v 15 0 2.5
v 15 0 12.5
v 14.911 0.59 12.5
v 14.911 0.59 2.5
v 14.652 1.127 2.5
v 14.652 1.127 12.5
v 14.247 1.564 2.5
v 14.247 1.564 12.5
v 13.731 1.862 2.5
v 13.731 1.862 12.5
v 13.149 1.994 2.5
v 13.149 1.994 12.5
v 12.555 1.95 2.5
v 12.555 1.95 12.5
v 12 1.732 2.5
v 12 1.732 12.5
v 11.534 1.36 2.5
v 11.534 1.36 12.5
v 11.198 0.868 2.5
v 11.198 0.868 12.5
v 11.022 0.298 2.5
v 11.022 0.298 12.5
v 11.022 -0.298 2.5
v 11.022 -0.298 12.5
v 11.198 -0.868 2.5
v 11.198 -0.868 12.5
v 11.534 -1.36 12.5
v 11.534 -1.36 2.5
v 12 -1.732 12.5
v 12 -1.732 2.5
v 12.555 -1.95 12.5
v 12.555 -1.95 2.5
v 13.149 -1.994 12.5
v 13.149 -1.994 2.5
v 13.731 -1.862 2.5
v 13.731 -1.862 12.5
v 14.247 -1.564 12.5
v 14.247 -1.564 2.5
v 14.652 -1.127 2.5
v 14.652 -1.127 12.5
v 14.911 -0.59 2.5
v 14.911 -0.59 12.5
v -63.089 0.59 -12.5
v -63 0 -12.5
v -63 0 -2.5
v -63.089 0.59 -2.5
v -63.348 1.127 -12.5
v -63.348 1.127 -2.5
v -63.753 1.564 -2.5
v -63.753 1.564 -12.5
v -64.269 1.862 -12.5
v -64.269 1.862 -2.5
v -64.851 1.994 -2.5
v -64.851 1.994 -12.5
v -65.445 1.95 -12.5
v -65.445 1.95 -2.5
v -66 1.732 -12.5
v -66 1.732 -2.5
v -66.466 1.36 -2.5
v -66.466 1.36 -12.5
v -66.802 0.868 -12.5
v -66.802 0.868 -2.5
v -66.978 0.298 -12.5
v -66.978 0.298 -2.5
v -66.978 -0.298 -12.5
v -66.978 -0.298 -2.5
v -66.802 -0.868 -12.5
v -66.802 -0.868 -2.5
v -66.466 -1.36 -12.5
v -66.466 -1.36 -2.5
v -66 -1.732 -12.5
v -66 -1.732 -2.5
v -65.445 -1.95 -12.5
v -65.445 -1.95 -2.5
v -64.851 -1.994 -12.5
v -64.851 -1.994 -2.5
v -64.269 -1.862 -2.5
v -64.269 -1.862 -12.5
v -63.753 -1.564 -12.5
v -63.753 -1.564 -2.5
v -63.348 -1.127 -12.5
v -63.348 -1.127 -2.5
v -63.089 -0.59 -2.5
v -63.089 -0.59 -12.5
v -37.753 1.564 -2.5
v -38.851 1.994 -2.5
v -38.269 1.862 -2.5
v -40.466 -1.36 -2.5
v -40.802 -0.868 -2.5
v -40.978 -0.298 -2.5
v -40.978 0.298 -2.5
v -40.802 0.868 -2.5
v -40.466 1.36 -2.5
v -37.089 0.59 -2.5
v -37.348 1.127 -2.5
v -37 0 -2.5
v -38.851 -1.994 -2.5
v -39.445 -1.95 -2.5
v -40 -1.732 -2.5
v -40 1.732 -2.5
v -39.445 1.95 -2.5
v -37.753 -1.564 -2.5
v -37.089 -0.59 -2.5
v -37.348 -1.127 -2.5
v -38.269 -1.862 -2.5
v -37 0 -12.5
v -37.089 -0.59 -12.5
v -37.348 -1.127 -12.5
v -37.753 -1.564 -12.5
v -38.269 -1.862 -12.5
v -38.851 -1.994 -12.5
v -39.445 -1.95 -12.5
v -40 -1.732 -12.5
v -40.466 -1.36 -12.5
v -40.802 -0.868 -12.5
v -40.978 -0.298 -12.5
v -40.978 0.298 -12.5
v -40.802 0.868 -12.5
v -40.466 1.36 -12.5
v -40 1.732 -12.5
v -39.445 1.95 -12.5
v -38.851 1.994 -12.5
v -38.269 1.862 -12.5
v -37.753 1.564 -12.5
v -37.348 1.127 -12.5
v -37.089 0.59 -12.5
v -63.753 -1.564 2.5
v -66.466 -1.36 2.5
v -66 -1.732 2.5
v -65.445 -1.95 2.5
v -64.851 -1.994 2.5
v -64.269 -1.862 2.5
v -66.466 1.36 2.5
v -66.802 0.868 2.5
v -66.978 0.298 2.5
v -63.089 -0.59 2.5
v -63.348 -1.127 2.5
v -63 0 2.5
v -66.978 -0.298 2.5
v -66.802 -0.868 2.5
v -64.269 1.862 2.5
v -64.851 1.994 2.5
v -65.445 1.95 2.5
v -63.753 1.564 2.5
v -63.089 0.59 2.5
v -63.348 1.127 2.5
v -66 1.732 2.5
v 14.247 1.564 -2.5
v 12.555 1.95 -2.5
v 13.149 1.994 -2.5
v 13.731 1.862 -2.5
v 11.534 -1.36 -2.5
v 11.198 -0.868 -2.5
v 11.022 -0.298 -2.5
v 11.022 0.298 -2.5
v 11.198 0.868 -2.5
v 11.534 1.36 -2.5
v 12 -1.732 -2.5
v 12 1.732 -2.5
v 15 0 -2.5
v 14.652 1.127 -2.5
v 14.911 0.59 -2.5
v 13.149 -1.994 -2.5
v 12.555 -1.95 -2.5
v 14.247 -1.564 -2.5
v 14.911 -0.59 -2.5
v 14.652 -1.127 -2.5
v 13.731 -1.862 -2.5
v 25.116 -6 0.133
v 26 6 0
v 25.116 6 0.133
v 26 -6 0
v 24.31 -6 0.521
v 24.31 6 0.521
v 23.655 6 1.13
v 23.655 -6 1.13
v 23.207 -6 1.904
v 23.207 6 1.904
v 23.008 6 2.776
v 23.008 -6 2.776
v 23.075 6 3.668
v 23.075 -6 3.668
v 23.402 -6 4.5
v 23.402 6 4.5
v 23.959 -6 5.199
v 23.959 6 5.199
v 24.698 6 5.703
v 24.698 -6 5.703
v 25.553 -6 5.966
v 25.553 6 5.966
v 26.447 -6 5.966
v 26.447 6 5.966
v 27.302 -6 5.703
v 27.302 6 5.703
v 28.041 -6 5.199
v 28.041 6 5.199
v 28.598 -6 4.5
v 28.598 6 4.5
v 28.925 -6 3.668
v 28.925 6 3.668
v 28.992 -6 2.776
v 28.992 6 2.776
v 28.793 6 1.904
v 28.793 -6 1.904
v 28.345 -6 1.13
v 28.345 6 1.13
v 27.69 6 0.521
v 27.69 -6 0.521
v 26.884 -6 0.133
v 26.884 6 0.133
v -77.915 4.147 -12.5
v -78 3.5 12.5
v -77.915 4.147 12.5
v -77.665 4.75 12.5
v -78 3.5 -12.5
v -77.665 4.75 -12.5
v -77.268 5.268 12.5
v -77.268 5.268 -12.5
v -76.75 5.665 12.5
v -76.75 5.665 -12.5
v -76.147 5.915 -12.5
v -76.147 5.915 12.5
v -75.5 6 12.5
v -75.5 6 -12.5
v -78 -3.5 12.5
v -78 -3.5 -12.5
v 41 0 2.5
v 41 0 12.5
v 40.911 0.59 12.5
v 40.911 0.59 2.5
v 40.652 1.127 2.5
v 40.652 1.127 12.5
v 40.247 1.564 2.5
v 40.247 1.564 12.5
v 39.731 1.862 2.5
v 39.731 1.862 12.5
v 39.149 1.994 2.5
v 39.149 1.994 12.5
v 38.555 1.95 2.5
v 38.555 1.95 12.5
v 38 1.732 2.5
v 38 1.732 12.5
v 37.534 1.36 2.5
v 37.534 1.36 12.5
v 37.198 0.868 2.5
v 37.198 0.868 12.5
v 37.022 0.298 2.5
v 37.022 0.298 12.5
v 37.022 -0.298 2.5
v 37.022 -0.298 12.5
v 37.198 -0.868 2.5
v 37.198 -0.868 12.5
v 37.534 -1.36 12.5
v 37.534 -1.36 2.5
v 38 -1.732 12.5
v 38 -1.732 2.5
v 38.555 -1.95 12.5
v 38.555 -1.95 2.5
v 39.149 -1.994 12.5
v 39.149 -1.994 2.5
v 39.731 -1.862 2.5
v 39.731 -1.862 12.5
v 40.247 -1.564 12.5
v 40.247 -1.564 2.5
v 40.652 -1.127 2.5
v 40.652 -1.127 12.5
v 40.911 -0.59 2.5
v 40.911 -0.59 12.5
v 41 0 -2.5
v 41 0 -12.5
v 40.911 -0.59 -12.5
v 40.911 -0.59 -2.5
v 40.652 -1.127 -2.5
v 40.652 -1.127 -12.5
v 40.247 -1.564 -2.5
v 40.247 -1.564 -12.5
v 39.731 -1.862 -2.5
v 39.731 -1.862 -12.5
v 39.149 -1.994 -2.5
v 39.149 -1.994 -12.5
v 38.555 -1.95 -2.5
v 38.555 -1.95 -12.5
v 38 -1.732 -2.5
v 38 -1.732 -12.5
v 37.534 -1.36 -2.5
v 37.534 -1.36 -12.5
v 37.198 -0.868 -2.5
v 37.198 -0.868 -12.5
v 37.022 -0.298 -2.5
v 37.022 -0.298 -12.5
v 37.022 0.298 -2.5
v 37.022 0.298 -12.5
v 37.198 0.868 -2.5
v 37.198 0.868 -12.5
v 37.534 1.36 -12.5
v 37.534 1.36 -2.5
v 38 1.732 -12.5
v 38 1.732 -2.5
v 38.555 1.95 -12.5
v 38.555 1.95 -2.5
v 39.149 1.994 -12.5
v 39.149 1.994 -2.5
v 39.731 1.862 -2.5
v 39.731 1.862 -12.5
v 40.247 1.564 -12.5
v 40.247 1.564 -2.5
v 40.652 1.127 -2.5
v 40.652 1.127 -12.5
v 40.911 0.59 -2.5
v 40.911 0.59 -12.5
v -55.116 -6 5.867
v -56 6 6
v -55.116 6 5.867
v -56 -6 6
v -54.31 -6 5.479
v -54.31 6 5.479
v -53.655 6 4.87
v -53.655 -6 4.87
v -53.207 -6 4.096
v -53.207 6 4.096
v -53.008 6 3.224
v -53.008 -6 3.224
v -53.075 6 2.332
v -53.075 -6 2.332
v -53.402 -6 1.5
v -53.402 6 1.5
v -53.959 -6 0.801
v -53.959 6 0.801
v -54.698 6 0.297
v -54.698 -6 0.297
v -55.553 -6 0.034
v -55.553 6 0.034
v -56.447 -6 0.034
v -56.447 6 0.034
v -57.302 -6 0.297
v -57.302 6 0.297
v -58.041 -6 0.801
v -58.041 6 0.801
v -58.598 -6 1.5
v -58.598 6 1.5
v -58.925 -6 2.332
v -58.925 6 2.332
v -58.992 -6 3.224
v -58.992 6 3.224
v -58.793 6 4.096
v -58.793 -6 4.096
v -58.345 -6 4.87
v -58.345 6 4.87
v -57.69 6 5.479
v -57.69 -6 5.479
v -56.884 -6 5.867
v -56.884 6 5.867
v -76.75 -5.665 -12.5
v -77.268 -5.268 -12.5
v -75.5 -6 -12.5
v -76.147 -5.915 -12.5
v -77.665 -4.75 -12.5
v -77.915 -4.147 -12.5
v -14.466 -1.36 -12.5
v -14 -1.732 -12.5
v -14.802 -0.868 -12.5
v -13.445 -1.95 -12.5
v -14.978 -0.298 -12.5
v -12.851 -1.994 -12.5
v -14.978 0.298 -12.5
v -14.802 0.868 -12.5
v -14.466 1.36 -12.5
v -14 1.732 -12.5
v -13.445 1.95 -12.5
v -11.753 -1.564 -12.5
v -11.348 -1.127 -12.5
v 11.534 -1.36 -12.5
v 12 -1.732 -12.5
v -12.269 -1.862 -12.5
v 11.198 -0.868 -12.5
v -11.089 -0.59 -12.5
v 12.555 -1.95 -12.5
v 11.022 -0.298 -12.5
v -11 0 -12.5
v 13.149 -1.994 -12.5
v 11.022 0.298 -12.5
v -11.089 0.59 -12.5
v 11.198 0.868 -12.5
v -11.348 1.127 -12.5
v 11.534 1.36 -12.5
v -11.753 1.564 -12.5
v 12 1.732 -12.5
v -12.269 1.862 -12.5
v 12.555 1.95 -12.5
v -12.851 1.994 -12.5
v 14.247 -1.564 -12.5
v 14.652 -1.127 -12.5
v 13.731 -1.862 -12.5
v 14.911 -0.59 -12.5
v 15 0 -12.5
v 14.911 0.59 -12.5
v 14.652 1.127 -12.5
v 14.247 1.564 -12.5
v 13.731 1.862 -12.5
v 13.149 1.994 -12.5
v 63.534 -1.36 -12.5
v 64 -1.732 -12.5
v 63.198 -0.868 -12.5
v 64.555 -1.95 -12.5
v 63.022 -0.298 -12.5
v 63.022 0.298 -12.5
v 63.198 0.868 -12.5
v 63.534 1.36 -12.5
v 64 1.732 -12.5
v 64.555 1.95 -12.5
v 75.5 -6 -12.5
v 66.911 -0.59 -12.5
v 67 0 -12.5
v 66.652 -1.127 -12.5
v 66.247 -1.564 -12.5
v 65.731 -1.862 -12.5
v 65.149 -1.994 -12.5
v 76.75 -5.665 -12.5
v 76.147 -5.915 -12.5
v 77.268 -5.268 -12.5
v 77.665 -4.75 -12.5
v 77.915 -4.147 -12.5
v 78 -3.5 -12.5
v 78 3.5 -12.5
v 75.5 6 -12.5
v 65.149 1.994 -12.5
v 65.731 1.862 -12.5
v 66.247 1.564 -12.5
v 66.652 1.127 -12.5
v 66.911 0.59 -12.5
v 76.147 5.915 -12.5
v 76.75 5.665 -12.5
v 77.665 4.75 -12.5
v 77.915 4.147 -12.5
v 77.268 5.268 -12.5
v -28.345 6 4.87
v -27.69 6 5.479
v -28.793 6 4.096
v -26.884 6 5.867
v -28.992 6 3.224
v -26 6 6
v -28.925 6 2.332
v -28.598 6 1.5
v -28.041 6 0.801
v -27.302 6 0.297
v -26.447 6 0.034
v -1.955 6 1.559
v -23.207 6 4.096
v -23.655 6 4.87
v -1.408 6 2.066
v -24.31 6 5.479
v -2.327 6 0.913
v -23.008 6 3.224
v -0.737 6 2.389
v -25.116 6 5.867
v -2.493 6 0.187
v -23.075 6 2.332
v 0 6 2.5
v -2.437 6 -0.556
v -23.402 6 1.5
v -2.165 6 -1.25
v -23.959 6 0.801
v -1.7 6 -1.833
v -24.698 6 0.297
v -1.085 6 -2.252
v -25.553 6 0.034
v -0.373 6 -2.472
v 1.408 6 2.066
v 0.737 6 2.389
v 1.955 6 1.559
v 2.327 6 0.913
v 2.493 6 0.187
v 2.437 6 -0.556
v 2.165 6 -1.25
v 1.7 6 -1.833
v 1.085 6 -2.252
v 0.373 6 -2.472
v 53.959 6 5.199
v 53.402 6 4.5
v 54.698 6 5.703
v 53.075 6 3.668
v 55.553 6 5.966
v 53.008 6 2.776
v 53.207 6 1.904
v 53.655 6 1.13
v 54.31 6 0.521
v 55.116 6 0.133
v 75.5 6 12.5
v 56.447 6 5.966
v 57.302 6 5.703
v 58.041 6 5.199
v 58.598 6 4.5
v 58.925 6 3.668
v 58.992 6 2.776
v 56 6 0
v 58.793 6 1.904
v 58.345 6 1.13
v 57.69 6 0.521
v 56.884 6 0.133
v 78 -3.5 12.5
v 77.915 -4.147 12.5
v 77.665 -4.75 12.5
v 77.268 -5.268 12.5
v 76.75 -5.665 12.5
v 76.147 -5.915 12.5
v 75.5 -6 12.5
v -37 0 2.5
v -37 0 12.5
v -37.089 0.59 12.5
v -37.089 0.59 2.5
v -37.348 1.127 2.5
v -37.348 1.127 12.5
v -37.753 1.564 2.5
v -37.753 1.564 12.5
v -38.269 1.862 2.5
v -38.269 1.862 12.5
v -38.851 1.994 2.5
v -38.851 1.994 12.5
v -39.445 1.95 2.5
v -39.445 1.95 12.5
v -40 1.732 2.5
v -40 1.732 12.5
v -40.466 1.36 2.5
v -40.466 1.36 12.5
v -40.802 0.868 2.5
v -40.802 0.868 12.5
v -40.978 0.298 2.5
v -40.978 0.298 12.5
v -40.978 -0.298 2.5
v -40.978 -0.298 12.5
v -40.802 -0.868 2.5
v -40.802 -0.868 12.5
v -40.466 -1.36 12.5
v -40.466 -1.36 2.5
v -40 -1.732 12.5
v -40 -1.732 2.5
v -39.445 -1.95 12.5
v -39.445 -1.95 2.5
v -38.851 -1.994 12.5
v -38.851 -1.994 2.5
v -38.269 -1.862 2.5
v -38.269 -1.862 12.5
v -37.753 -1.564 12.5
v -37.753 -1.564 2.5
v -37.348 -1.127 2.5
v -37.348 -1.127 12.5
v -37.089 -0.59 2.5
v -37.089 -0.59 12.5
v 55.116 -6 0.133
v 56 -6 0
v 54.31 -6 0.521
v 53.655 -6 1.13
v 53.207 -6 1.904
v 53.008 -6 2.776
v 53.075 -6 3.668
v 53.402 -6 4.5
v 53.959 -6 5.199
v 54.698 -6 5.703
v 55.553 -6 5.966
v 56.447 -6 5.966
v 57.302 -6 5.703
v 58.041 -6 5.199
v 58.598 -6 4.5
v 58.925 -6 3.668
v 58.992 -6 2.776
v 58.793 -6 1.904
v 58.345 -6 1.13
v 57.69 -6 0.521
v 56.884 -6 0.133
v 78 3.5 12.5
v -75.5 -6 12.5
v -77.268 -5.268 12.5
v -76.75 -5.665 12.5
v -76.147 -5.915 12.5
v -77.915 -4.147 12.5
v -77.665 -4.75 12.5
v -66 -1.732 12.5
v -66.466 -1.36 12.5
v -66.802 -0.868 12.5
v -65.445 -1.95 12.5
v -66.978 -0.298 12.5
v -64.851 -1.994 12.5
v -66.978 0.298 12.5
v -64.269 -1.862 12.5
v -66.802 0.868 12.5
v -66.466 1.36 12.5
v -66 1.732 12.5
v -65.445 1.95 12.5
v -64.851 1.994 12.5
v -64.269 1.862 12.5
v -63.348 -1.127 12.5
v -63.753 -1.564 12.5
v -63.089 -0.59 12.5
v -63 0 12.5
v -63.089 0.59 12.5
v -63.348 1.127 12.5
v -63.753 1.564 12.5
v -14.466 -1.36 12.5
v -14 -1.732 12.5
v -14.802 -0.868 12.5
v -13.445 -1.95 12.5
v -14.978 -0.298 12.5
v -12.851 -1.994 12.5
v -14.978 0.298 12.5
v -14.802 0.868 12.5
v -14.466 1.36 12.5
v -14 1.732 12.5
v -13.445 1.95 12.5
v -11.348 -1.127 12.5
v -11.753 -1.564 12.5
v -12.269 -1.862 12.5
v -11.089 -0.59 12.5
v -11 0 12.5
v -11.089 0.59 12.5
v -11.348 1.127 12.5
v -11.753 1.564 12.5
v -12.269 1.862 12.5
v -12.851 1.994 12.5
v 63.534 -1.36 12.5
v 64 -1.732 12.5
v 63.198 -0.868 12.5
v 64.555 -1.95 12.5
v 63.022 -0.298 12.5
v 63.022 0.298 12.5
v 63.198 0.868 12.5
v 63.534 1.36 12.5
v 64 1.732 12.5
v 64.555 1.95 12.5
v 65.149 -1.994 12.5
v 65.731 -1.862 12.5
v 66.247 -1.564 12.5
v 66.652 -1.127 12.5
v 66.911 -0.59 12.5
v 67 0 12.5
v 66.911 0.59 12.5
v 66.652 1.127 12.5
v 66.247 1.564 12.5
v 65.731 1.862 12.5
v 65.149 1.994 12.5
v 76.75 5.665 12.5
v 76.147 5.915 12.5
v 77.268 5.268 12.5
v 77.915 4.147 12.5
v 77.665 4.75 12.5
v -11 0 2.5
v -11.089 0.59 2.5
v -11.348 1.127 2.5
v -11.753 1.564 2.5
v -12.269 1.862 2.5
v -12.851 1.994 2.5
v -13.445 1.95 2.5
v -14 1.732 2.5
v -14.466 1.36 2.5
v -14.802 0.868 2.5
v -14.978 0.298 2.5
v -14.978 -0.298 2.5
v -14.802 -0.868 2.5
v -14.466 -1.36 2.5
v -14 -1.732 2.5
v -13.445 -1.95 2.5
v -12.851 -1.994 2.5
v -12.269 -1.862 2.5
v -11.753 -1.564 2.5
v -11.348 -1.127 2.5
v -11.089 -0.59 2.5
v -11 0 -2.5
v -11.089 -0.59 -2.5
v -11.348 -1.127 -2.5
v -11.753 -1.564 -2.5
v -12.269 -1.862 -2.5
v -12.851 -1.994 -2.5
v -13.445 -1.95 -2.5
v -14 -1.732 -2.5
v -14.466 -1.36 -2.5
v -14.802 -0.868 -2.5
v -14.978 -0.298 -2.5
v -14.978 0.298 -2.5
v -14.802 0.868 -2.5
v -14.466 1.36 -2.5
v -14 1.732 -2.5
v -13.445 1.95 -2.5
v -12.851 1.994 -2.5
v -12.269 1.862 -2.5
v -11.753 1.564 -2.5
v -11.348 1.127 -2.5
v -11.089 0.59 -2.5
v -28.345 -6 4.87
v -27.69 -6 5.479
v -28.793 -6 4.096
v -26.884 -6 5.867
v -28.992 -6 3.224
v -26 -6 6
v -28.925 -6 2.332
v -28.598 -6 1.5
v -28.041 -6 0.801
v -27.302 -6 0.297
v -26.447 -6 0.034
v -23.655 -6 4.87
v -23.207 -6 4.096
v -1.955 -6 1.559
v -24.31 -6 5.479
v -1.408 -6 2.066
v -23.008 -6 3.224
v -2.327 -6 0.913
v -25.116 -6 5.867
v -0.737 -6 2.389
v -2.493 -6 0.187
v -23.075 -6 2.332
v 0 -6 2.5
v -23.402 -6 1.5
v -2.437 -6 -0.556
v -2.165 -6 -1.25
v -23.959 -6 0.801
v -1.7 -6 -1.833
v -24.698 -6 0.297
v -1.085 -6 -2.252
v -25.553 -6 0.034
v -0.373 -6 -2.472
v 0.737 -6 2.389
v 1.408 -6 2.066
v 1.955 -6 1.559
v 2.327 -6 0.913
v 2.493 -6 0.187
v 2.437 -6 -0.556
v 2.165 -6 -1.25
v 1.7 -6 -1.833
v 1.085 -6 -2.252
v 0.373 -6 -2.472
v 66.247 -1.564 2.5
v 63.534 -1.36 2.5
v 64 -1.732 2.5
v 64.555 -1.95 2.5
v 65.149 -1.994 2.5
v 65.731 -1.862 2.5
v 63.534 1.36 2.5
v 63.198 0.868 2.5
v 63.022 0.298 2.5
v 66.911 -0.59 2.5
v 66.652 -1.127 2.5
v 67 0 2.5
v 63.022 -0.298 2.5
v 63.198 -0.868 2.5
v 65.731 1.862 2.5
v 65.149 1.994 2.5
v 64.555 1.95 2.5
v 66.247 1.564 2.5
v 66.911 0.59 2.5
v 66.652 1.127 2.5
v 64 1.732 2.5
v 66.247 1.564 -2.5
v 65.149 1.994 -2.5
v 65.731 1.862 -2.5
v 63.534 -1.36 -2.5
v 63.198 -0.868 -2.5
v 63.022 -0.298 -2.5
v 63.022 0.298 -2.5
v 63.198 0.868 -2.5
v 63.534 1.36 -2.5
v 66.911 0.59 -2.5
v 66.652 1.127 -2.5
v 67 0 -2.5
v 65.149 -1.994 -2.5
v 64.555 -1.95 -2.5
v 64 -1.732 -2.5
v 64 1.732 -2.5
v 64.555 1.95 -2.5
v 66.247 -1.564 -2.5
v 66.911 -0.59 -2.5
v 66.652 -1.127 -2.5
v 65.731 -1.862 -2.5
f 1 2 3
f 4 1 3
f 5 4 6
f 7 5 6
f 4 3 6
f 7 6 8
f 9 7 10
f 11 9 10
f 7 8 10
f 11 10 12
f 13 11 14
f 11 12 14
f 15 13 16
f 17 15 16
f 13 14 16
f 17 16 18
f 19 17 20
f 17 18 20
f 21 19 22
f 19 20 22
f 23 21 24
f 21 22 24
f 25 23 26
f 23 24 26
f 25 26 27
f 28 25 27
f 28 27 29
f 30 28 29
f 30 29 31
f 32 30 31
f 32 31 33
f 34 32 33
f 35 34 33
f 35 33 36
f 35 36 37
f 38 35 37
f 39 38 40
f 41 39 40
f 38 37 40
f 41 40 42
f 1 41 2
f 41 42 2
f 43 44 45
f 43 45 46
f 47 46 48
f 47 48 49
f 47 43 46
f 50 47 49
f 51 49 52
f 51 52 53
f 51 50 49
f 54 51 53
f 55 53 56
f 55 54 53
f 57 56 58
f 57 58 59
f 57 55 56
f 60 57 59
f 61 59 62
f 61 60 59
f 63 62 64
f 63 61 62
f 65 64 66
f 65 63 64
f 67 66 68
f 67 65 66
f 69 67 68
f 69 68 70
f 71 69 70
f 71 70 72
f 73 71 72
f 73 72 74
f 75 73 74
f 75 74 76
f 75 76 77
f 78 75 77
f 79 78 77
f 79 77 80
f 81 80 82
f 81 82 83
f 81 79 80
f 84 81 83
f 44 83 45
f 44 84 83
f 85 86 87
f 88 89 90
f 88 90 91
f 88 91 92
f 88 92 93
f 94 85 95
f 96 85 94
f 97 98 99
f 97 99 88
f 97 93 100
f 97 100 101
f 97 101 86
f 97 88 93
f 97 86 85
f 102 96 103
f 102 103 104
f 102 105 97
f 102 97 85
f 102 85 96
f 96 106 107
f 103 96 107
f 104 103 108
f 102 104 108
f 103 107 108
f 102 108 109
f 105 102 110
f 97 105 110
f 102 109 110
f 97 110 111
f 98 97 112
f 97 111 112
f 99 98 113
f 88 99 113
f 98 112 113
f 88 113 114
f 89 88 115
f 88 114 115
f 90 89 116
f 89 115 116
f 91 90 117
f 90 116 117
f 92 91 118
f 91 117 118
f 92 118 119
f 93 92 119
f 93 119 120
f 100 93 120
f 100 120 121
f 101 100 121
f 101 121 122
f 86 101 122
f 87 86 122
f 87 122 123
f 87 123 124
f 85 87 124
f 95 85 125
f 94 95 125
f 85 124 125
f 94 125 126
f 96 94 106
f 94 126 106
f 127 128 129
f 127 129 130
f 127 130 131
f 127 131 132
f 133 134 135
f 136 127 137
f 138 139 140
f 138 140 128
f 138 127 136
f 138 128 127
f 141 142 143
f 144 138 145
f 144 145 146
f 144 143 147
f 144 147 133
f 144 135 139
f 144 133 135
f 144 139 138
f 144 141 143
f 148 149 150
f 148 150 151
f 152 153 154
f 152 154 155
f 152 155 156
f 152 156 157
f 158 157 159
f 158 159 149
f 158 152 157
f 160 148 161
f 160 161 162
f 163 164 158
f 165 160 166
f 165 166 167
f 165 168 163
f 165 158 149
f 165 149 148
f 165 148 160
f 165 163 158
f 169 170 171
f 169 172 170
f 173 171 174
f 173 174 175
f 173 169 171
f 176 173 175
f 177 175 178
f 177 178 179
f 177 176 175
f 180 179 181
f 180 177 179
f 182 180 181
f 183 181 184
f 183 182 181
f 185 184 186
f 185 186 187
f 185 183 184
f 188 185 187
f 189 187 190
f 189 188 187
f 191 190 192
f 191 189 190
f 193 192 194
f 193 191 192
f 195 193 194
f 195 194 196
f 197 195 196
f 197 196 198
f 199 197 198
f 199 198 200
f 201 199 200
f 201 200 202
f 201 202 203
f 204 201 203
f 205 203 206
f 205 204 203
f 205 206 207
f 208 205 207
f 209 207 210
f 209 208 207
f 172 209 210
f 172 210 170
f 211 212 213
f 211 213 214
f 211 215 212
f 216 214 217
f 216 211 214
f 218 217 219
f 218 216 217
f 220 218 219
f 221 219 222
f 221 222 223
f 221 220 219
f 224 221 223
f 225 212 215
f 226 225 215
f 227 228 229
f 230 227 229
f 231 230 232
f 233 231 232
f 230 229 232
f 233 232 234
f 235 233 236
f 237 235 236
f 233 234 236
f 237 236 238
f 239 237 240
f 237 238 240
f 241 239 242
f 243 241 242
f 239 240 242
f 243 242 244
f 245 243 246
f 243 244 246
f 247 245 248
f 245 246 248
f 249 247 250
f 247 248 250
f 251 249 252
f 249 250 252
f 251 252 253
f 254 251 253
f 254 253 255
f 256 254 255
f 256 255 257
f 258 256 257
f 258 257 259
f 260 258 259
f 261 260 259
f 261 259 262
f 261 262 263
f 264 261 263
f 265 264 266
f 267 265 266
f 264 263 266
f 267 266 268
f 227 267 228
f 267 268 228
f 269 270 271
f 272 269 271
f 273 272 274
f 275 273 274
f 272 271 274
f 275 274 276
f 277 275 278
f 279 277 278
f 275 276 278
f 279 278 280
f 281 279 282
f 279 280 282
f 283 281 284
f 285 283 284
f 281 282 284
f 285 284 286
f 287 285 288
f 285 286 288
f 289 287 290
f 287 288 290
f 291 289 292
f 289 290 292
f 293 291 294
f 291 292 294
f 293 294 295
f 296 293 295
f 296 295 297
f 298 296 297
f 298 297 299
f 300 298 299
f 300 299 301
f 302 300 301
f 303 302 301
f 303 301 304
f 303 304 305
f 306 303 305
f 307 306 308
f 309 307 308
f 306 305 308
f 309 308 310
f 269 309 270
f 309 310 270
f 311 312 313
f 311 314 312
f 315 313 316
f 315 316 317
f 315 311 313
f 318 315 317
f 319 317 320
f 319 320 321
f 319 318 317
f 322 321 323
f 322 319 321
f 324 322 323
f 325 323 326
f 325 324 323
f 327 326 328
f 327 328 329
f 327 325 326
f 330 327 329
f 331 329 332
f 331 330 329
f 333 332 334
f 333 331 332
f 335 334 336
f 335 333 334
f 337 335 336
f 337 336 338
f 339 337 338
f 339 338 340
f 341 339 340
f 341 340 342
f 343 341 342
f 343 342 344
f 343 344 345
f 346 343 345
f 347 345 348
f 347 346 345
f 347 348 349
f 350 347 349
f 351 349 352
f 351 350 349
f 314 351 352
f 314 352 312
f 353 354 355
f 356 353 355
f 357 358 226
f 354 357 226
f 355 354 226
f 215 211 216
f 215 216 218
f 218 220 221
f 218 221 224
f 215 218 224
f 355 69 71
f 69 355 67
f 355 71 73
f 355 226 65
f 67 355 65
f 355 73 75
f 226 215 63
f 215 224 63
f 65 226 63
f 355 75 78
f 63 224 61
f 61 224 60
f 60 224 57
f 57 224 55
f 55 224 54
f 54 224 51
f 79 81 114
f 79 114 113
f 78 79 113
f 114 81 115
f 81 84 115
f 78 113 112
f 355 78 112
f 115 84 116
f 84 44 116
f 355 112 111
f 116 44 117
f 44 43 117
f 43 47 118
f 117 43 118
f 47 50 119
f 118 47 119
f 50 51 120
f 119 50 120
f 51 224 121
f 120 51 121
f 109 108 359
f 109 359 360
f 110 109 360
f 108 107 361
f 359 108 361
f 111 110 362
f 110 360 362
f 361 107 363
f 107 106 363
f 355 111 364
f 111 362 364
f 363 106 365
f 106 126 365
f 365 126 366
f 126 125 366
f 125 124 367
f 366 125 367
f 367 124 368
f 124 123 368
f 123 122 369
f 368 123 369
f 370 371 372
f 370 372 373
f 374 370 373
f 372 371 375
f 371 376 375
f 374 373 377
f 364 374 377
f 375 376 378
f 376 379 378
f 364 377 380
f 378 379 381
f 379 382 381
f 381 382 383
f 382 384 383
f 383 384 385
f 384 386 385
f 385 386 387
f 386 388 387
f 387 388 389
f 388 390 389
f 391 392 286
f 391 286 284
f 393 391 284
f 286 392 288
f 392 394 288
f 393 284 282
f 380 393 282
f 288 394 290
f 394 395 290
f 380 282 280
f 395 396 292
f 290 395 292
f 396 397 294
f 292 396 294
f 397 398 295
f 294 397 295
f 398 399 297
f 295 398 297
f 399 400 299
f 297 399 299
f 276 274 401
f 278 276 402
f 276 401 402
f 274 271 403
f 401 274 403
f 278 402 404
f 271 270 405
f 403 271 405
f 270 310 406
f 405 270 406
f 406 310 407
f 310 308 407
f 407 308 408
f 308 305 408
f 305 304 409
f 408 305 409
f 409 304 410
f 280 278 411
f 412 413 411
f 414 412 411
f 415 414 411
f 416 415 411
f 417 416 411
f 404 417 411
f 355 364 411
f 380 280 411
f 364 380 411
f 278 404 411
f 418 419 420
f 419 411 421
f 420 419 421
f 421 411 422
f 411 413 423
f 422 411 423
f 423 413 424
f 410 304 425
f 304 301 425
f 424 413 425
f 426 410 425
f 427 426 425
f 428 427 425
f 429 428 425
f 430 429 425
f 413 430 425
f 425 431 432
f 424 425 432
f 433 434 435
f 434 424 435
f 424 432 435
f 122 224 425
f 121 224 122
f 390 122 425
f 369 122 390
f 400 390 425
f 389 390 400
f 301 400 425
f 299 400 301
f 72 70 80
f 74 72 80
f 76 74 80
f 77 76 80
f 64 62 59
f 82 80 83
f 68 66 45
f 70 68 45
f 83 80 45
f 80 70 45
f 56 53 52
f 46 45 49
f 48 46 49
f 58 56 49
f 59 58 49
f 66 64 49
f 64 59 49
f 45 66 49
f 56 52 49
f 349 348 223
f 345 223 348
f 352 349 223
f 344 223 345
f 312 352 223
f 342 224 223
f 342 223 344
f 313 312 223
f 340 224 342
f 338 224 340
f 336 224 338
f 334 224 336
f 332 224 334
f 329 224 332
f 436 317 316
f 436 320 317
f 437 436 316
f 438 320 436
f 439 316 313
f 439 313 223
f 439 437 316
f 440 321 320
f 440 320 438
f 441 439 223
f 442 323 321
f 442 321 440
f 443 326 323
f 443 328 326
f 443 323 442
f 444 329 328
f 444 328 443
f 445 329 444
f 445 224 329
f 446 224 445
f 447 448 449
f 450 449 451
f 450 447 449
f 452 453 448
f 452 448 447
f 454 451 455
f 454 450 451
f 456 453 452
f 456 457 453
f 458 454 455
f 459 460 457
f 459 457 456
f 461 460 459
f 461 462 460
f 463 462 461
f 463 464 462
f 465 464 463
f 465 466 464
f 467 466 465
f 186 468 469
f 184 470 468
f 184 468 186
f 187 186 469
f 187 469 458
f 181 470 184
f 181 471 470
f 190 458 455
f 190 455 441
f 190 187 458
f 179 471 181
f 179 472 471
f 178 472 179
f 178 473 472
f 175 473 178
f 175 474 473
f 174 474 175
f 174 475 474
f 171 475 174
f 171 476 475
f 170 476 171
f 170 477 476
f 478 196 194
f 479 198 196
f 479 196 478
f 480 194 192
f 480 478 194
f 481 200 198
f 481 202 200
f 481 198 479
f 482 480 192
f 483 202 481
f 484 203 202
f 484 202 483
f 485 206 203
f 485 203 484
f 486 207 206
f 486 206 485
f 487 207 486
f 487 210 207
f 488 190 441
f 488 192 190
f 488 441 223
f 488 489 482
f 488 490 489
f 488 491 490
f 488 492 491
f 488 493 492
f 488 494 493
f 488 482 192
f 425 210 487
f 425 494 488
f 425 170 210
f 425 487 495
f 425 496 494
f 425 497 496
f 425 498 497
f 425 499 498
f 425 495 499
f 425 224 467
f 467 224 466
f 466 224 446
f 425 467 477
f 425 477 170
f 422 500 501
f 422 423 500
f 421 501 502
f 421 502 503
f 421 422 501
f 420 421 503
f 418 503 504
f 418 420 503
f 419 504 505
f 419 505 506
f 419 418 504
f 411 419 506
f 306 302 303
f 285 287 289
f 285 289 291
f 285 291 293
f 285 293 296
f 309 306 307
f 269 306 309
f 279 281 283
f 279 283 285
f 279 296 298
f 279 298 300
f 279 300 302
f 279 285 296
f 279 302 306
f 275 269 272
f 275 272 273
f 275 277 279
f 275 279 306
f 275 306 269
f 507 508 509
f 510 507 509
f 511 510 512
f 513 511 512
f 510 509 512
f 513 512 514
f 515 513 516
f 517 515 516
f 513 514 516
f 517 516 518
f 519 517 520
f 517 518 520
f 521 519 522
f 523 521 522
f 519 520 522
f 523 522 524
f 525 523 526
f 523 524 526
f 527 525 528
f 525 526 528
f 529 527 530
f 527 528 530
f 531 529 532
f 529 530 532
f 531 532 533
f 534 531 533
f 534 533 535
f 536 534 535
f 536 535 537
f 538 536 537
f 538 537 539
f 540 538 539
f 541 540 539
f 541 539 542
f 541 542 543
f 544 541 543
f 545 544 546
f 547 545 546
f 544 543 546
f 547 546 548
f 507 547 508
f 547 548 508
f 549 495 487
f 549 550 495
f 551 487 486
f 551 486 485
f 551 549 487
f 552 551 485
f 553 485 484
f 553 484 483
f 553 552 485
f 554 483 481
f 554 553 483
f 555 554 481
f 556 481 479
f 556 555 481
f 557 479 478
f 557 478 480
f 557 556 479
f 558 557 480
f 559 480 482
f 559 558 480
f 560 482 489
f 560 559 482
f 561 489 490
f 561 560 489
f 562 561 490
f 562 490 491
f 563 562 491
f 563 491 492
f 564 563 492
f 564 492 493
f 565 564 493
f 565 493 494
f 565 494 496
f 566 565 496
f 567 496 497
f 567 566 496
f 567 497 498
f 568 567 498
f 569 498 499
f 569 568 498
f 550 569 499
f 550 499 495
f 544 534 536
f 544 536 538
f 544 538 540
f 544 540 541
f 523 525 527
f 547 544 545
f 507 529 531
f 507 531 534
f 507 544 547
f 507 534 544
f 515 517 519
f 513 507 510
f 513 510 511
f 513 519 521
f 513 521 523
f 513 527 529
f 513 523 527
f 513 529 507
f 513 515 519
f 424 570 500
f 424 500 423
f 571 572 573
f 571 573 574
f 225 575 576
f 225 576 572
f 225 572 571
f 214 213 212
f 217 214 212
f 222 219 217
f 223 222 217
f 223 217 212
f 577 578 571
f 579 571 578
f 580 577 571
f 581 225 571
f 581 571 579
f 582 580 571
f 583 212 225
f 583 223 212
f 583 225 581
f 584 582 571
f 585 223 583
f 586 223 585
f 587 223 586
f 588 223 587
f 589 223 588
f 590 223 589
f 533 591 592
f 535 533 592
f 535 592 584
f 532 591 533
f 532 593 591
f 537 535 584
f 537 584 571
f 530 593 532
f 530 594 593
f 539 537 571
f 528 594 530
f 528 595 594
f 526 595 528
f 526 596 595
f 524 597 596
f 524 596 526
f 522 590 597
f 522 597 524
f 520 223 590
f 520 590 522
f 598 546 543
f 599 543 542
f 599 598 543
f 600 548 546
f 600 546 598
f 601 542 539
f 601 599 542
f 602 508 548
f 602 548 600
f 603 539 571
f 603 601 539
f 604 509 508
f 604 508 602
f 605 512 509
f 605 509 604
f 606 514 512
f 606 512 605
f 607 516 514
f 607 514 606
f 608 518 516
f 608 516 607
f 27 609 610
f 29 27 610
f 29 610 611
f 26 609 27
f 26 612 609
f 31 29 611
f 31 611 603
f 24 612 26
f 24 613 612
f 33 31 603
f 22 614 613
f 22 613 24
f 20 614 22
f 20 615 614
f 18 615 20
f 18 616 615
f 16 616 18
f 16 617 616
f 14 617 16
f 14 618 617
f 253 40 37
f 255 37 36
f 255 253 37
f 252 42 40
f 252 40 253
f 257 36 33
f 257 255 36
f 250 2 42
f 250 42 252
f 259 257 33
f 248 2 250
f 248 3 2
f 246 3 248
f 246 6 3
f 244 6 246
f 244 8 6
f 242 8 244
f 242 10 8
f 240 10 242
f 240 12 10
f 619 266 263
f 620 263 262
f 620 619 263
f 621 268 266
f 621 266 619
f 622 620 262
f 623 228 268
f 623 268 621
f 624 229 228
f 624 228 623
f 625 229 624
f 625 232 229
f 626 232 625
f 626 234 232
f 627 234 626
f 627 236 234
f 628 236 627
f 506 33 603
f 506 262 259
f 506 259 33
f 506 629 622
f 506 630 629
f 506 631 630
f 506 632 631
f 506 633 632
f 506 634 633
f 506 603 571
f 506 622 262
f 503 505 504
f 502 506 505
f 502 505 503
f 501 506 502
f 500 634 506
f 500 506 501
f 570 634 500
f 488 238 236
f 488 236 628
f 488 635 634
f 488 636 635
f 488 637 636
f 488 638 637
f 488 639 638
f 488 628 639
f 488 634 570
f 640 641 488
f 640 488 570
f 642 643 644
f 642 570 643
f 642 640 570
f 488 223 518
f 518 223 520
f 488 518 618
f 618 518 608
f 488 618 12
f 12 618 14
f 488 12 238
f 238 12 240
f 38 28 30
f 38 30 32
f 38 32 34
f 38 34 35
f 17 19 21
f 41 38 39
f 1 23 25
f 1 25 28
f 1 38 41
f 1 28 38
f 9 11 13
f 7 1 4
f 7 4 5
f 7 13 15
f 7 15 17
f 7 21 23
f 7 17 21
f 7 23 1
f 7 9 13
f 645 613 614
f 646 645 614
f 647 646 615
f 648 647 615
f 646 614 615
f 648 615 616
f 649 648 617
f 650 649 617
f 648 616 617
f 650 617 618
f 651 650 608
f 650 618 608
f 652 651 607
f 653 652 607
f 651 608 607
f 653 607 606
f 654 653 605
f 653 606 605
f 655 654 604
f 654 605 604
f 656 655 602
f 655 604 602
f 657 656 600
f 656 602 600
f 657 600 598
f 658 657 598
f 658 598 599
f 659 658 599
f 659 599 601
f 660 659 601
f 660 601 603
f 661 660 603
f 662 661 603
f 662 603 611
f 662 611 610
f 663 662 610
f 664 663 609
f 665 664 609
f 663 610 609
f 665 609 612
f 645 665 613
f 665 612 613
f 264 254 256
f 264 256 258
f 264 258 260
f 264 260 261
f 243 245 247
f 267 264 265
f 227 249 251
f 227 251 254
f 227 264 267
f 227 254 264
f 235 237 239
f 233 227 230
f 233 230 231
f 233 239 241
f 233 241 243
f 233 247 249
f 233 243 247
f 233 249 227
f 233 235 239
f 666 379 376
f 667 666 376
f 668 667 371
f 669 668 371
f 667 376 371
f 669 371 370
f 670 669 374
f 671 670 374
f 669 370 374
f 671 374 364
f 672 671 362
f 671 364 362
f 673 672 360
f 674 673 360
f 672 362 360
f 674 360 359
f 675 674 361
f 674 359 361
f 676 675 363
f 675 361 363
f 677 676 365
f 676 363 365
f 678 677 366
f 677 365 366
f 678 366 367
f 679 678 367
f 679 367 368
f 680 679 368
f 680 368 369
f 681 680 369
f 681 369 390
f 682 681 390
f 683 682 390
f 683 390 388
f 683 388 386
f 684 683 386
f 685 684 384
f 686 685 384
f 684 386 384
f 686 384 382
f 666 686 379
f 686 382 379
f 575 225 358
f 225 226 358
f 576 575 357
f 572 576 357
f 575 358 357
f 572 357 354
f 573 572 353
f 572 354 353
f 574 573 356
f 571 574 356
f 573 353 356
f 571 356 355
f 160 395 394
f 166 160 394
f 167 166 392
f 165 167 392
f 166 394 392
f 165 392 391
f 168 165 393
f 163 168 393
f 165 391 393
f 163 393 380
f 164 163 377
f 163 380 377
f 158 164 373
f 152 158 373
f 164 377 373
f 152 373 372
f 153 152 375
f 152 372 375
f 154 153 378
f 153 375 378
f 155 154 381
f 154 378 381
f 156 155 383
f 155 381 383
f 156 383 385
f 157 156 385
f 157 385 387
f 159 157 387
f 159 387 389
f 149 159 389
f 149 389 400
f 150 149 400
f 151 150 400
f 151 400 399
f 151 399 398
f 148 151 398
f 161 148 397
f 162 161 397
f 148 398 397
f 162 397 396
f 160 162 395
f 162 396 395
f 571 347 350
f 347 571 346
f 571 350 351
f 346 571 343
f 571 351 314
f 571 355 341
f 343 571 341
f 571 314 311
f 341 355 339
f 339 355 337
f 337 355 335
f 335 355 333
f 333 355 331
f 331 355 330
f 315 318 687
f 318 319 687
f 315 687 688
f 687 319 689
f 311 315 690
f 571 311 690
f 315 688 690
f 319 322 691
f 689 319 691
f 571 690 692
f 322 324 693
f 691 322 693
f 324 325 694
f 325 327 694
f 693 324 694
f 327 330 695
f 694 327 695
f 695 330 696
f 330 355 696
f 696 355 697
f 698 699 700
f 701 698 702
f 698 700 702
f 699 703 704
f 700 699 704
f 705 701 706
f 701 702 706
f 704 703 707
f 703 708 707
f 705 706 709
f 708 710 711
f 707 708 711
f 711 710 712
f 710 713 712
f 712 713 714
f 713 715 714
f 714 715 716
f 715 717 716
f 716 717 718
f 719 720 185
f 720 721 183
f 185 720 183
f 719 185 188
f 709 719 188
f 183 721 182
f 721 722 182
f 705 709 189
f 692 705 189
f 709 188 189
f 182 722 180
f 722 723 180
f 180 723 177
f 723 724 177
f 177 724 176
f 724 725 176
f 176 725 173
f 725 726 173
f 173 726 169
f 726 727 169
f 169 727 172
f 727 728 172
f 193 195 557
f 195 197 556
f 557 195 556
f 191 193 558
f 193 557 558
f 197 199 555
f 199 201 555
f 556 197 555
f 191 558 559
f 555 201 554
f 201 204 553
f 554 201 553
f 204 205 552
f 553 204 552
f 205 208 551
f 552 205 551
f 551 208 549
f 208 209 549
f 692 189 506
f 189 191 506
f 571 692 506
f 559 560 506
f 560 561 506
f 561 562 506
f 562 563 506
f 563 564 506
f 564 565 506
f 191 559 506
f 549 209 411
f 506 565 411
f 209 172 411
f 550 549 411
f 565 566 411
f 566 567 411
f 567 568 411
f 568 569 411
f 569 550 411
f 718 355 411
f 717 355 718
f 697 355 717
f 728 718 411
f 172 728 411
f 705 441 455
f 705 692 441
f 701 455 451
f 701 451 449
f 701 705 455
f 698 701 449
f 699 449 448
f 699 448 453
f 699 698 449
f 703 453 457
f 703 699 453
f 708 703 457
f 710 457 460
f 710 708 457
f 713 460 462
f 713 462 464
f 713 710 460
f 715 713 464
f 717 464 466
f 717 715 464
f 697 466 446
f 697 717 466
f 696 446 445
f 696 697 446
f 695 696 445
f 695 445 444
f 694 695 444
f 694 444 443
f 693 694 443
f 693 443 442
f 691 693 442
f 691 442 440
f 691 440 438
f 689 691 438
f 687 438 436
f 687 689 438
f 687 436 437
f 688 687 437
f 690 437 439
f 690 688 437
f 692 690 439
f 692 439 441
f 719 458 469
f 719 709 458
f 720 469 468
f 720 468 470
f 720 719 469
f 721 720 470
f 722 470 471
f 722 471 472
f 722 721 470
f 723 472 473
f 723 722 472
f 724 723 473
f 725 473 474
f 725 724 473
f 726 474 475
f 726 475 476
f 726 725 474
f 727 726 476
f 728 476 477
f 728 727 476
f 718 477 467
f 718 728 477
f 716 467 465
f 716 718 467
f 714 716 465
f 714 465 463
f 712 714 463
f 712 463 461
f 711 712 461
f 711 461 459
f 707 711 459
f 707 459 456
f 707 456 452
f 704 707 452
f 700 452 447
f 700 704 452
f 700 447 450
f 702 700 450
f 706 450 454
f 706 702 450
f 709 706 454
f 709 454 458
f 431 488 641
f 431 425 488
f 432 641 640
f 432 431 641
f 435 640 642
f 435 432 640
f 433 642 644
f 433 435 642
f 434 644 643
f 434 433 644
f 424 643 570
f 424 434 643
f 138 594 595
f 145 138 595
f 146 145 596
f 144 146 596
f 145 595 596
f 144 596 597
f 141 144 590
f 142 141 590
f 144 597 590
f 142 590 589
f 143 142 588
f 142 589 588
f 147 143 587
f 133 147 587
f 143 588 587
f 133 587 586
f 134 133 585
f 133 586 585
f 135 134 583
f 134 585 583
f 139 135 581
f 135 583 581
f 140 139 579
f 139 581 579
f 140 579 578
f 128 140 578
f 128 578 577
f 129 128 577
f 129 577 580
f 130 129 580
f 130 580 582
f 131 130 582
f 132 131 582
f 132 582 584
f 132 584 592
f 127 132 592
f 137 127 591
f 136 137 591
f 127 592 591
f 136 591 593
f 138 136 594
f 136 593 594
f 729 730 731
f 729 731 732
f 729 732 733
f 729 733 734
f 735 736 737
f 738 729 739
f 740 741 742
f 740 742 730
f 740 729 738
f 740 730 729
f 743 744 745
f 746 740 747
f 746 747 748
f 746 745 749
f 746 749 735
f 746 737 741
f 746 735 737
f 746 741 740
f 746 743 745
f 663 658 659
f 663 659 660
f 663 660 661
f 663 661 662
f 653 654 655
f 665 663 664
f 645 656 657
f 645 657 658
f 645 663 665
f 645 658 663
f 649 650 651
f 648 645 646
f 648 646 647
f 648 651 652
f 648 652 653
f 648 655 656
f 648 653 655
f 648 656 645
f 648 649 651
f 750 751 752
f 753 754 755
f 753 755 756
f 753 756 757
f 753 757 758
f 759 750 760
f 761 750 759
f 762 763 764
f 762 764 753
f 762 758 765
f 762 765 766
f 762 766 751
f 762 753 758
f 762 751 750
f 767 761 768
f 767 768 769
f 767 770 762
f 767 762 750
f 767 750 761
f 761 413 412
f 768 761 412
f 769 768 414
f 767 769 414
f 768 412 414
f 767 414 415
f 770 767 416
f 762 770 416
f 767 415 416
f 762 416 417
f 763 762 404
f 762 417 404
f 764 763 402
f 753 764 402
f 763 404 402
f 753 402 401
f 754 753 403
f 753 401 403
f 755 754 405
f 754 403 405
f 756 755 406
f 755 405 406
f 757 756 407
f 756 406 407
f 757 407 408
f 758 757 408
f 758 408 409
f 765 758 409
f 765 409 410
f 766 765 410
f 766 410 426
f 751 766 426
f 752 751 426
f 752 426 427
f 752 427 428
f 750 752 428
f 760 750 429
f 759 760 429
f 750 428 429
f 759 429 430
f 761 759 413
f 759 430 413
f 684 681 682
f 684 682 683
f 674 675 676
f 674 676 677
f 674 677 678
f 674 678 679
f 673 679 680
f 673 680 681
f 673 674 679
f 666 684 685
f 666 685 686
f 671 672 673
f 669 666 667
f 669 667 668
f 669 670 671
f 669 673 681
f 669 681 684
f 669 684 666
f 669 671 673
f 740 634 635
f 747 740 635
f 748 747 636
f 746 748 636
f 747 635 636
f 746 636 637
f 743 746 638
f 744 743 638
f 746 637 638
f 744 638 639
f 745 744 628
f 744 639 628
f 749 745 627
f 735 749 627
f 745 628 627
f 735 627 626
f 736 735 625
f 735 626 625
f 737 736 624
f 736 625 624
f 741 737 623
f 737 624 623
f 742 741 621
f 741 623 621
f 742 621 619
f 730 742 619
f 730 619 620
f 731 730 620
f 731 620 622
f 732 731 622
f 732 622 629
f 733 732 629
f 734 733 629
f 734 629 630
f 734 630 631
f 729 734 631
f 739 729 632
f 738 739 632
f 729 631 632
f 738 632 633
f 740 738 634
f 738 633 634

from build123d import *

# Parameters (mm, degrees)
SKETCH1_W               = 156
SKETCH1_H               = 25
SKETCH1_R               = 2.5
SKETCH1_R_2             = 3
BOSS_EXTRUDE1_DEPTH     = 6
FILLET1_R               = 2.5
SKETCH2_R               = 2
CUT_EXTRUDE1_DEPTH      = 10
LPATTERN1_COUNT         = 6
LPATTERN1_PITCH         = 26
MIRROR1_COPY_1_SKETCH_R = 2
MIRROR1_COPY_1_DEPTH    = 10
MIRROR1_COPY_2_SKETCH_R = 2
MIRROR1_COPY_2_DEPTH    = 10
MIRROR1_COPY_3_SKETCH_R = 2
MIRROR1_COPY_3_DEPTH    = 10
MIRROR1_COPY_4_SKETCH_R = 2
MIRROR1_COPY_4_DEPTH    = 10
MIRROR1_COPY_5_SKETCH_R = 2
MIRROR1_COPY_5_DEPTH    = 10


with BuildPart() as part:
    # Sketch1 → Boss-Extrude1 (new, symmetric)
    with BuildSketch(Plane(origin=(0, 0, 0), x_dir=(1, 0, 0), z_dir=(0, 1, 0))):
        Rectangle(SKETCH1_W, SKETCH1_H)
        with Locations(Location((0, 0, 0), (0, 0, 270))):
            Circle(SKETCH1_R, mode=Mode.SUBTRACT)
        with Locations(Location((-56, -3, 0), (0, 0, 270))):
            Circle(SKETCH1_R_2, mode=Mode.SUBTRACT)
        with Locations(Location((-26, -3, 0), (0, 0, 270))):
            Circle(SKETCH1_R_2, mode=Mode.SUBTRACT)
        with Locations(Location((56, -3, 0), (0, 0, 90))):
            Circle(SKETCH1_R_2, mode=Mode.SUBTRACT)
        with Locations(Location((26, -3, 0), (0, 0, 90))):
            Circle(SKETCH1_R_2, mode=Mode.SUBTRACT)
    extrude(amount=BOSS_EXTRUDE1_DEPTH, both=True)

    # Fillet1
    fillet1_edges = [part.edges().sort_by_distance(p)[0] for p in [
        (-78, 6, 0),
        (78, 6, 0),
        (-78, -6, 0),
        (78, -6, 0),
    ]]
    fillet(fillet1_edges, radius=FILLET1_R)

    # Sketch2 → Cut-Extrude1 (cut)
    with BuildSketch(Plane.XY.offset(12.5)):
        with Locations((-65, 0)):
            Circle(SKETCH2_R)
    cut_extrude1 = extrude(amount=-CUT_EXTRUDE1_DEPTH, mode=Mode.SUBTRACT)

    # LPattern1: Cut-Extrude1 ×6
    with Locations(*[(i * LPATTERN1_PITCH, 0, 0) for i in range(1, LPATTERN1_COUNT)]):
        add(cut_extrude1, mode=Mode.SUBTRACT)

    # Mirror1: Cut-Extrude1 across plane
    add(cut_extrude1.mirror(Plane.XY), mode=Mode.SUBTRACT)

    # Mirror1 copy 1 sketch → Mirror1 copy 1 (cut)
    with BuildSketch(Plane(origin=(26, 0, -12.5), x_dir=(1, 0, 0), z_dir=(0, 0, -1))):
        with Locations((-65, 0)):
            Circle(MIRROR1_COPY_1_SKETCH_R)
    extrude(amount=-MIRROR1_COPY_1_DEPTH, mode=Mode.SUBTRACT)

    # Mirror1 copy 2 sketch → Mirror1 copy 2 (cut)
    with BuildSketch(Plane(origin=(52, 0, -12.5), x_dir=(1, 0, 0), z_dir=(0, 0, -1))):
        with Locations((-65, 0)):
            Circle(MIRROR1_COPY_2_SKETCH_R)
    extrude(amount=-MIRROR1_COPY_2_DEPTH, mode=Mode.SUBTRACT)

    # Mirror1 copy 3 sketch → Mirror1 copy 3 (cut)
    with BuildSketch(Plane(origin=(78, 0, -12.5), x_dir=(1, 0, 0), z_dir=(0, 0, -1))):
        with Locations((-65, 0)):
            Circle(MIRROR1_COPY_3_SKETCH_R)
    extrude(amount=-MIRROR1_COPY_3_DEPTH, mode=Mode.SUBTRACT)

    # Mirror1 copy 4 sketch → Mirror1 copy 4 (cut)
    with BuildSketch(Plane(origin=(104, 0, -12.5), x_dir=(1, 0, 0), z_dir=(0, 0, -1))):
        with Locations((-65, 0)):
            Circle(MIRROR1_COPY_4_SKETCH_R)
    extrude(amount=-MIRROR1_COPY_4_DEPTH, mode=Mode.SUBTRACT)

    # Mirror1 copy 5 sketch → Mirror1 copy 5 (cut)
    with BuildSketch(Plane(origin=(130, 0, -12.5), x_dir=(1, 0, 0), z_dir=(0, 0, -1))):
        with Locations((-65, 0)):
            Circle(MIRROR1_COPY_5_SKETCH_R)
    extrude(amount=-MIRROR1_COPY_5_DEPTH, mode=Mode.SUBTRACT)


solid = part.part
